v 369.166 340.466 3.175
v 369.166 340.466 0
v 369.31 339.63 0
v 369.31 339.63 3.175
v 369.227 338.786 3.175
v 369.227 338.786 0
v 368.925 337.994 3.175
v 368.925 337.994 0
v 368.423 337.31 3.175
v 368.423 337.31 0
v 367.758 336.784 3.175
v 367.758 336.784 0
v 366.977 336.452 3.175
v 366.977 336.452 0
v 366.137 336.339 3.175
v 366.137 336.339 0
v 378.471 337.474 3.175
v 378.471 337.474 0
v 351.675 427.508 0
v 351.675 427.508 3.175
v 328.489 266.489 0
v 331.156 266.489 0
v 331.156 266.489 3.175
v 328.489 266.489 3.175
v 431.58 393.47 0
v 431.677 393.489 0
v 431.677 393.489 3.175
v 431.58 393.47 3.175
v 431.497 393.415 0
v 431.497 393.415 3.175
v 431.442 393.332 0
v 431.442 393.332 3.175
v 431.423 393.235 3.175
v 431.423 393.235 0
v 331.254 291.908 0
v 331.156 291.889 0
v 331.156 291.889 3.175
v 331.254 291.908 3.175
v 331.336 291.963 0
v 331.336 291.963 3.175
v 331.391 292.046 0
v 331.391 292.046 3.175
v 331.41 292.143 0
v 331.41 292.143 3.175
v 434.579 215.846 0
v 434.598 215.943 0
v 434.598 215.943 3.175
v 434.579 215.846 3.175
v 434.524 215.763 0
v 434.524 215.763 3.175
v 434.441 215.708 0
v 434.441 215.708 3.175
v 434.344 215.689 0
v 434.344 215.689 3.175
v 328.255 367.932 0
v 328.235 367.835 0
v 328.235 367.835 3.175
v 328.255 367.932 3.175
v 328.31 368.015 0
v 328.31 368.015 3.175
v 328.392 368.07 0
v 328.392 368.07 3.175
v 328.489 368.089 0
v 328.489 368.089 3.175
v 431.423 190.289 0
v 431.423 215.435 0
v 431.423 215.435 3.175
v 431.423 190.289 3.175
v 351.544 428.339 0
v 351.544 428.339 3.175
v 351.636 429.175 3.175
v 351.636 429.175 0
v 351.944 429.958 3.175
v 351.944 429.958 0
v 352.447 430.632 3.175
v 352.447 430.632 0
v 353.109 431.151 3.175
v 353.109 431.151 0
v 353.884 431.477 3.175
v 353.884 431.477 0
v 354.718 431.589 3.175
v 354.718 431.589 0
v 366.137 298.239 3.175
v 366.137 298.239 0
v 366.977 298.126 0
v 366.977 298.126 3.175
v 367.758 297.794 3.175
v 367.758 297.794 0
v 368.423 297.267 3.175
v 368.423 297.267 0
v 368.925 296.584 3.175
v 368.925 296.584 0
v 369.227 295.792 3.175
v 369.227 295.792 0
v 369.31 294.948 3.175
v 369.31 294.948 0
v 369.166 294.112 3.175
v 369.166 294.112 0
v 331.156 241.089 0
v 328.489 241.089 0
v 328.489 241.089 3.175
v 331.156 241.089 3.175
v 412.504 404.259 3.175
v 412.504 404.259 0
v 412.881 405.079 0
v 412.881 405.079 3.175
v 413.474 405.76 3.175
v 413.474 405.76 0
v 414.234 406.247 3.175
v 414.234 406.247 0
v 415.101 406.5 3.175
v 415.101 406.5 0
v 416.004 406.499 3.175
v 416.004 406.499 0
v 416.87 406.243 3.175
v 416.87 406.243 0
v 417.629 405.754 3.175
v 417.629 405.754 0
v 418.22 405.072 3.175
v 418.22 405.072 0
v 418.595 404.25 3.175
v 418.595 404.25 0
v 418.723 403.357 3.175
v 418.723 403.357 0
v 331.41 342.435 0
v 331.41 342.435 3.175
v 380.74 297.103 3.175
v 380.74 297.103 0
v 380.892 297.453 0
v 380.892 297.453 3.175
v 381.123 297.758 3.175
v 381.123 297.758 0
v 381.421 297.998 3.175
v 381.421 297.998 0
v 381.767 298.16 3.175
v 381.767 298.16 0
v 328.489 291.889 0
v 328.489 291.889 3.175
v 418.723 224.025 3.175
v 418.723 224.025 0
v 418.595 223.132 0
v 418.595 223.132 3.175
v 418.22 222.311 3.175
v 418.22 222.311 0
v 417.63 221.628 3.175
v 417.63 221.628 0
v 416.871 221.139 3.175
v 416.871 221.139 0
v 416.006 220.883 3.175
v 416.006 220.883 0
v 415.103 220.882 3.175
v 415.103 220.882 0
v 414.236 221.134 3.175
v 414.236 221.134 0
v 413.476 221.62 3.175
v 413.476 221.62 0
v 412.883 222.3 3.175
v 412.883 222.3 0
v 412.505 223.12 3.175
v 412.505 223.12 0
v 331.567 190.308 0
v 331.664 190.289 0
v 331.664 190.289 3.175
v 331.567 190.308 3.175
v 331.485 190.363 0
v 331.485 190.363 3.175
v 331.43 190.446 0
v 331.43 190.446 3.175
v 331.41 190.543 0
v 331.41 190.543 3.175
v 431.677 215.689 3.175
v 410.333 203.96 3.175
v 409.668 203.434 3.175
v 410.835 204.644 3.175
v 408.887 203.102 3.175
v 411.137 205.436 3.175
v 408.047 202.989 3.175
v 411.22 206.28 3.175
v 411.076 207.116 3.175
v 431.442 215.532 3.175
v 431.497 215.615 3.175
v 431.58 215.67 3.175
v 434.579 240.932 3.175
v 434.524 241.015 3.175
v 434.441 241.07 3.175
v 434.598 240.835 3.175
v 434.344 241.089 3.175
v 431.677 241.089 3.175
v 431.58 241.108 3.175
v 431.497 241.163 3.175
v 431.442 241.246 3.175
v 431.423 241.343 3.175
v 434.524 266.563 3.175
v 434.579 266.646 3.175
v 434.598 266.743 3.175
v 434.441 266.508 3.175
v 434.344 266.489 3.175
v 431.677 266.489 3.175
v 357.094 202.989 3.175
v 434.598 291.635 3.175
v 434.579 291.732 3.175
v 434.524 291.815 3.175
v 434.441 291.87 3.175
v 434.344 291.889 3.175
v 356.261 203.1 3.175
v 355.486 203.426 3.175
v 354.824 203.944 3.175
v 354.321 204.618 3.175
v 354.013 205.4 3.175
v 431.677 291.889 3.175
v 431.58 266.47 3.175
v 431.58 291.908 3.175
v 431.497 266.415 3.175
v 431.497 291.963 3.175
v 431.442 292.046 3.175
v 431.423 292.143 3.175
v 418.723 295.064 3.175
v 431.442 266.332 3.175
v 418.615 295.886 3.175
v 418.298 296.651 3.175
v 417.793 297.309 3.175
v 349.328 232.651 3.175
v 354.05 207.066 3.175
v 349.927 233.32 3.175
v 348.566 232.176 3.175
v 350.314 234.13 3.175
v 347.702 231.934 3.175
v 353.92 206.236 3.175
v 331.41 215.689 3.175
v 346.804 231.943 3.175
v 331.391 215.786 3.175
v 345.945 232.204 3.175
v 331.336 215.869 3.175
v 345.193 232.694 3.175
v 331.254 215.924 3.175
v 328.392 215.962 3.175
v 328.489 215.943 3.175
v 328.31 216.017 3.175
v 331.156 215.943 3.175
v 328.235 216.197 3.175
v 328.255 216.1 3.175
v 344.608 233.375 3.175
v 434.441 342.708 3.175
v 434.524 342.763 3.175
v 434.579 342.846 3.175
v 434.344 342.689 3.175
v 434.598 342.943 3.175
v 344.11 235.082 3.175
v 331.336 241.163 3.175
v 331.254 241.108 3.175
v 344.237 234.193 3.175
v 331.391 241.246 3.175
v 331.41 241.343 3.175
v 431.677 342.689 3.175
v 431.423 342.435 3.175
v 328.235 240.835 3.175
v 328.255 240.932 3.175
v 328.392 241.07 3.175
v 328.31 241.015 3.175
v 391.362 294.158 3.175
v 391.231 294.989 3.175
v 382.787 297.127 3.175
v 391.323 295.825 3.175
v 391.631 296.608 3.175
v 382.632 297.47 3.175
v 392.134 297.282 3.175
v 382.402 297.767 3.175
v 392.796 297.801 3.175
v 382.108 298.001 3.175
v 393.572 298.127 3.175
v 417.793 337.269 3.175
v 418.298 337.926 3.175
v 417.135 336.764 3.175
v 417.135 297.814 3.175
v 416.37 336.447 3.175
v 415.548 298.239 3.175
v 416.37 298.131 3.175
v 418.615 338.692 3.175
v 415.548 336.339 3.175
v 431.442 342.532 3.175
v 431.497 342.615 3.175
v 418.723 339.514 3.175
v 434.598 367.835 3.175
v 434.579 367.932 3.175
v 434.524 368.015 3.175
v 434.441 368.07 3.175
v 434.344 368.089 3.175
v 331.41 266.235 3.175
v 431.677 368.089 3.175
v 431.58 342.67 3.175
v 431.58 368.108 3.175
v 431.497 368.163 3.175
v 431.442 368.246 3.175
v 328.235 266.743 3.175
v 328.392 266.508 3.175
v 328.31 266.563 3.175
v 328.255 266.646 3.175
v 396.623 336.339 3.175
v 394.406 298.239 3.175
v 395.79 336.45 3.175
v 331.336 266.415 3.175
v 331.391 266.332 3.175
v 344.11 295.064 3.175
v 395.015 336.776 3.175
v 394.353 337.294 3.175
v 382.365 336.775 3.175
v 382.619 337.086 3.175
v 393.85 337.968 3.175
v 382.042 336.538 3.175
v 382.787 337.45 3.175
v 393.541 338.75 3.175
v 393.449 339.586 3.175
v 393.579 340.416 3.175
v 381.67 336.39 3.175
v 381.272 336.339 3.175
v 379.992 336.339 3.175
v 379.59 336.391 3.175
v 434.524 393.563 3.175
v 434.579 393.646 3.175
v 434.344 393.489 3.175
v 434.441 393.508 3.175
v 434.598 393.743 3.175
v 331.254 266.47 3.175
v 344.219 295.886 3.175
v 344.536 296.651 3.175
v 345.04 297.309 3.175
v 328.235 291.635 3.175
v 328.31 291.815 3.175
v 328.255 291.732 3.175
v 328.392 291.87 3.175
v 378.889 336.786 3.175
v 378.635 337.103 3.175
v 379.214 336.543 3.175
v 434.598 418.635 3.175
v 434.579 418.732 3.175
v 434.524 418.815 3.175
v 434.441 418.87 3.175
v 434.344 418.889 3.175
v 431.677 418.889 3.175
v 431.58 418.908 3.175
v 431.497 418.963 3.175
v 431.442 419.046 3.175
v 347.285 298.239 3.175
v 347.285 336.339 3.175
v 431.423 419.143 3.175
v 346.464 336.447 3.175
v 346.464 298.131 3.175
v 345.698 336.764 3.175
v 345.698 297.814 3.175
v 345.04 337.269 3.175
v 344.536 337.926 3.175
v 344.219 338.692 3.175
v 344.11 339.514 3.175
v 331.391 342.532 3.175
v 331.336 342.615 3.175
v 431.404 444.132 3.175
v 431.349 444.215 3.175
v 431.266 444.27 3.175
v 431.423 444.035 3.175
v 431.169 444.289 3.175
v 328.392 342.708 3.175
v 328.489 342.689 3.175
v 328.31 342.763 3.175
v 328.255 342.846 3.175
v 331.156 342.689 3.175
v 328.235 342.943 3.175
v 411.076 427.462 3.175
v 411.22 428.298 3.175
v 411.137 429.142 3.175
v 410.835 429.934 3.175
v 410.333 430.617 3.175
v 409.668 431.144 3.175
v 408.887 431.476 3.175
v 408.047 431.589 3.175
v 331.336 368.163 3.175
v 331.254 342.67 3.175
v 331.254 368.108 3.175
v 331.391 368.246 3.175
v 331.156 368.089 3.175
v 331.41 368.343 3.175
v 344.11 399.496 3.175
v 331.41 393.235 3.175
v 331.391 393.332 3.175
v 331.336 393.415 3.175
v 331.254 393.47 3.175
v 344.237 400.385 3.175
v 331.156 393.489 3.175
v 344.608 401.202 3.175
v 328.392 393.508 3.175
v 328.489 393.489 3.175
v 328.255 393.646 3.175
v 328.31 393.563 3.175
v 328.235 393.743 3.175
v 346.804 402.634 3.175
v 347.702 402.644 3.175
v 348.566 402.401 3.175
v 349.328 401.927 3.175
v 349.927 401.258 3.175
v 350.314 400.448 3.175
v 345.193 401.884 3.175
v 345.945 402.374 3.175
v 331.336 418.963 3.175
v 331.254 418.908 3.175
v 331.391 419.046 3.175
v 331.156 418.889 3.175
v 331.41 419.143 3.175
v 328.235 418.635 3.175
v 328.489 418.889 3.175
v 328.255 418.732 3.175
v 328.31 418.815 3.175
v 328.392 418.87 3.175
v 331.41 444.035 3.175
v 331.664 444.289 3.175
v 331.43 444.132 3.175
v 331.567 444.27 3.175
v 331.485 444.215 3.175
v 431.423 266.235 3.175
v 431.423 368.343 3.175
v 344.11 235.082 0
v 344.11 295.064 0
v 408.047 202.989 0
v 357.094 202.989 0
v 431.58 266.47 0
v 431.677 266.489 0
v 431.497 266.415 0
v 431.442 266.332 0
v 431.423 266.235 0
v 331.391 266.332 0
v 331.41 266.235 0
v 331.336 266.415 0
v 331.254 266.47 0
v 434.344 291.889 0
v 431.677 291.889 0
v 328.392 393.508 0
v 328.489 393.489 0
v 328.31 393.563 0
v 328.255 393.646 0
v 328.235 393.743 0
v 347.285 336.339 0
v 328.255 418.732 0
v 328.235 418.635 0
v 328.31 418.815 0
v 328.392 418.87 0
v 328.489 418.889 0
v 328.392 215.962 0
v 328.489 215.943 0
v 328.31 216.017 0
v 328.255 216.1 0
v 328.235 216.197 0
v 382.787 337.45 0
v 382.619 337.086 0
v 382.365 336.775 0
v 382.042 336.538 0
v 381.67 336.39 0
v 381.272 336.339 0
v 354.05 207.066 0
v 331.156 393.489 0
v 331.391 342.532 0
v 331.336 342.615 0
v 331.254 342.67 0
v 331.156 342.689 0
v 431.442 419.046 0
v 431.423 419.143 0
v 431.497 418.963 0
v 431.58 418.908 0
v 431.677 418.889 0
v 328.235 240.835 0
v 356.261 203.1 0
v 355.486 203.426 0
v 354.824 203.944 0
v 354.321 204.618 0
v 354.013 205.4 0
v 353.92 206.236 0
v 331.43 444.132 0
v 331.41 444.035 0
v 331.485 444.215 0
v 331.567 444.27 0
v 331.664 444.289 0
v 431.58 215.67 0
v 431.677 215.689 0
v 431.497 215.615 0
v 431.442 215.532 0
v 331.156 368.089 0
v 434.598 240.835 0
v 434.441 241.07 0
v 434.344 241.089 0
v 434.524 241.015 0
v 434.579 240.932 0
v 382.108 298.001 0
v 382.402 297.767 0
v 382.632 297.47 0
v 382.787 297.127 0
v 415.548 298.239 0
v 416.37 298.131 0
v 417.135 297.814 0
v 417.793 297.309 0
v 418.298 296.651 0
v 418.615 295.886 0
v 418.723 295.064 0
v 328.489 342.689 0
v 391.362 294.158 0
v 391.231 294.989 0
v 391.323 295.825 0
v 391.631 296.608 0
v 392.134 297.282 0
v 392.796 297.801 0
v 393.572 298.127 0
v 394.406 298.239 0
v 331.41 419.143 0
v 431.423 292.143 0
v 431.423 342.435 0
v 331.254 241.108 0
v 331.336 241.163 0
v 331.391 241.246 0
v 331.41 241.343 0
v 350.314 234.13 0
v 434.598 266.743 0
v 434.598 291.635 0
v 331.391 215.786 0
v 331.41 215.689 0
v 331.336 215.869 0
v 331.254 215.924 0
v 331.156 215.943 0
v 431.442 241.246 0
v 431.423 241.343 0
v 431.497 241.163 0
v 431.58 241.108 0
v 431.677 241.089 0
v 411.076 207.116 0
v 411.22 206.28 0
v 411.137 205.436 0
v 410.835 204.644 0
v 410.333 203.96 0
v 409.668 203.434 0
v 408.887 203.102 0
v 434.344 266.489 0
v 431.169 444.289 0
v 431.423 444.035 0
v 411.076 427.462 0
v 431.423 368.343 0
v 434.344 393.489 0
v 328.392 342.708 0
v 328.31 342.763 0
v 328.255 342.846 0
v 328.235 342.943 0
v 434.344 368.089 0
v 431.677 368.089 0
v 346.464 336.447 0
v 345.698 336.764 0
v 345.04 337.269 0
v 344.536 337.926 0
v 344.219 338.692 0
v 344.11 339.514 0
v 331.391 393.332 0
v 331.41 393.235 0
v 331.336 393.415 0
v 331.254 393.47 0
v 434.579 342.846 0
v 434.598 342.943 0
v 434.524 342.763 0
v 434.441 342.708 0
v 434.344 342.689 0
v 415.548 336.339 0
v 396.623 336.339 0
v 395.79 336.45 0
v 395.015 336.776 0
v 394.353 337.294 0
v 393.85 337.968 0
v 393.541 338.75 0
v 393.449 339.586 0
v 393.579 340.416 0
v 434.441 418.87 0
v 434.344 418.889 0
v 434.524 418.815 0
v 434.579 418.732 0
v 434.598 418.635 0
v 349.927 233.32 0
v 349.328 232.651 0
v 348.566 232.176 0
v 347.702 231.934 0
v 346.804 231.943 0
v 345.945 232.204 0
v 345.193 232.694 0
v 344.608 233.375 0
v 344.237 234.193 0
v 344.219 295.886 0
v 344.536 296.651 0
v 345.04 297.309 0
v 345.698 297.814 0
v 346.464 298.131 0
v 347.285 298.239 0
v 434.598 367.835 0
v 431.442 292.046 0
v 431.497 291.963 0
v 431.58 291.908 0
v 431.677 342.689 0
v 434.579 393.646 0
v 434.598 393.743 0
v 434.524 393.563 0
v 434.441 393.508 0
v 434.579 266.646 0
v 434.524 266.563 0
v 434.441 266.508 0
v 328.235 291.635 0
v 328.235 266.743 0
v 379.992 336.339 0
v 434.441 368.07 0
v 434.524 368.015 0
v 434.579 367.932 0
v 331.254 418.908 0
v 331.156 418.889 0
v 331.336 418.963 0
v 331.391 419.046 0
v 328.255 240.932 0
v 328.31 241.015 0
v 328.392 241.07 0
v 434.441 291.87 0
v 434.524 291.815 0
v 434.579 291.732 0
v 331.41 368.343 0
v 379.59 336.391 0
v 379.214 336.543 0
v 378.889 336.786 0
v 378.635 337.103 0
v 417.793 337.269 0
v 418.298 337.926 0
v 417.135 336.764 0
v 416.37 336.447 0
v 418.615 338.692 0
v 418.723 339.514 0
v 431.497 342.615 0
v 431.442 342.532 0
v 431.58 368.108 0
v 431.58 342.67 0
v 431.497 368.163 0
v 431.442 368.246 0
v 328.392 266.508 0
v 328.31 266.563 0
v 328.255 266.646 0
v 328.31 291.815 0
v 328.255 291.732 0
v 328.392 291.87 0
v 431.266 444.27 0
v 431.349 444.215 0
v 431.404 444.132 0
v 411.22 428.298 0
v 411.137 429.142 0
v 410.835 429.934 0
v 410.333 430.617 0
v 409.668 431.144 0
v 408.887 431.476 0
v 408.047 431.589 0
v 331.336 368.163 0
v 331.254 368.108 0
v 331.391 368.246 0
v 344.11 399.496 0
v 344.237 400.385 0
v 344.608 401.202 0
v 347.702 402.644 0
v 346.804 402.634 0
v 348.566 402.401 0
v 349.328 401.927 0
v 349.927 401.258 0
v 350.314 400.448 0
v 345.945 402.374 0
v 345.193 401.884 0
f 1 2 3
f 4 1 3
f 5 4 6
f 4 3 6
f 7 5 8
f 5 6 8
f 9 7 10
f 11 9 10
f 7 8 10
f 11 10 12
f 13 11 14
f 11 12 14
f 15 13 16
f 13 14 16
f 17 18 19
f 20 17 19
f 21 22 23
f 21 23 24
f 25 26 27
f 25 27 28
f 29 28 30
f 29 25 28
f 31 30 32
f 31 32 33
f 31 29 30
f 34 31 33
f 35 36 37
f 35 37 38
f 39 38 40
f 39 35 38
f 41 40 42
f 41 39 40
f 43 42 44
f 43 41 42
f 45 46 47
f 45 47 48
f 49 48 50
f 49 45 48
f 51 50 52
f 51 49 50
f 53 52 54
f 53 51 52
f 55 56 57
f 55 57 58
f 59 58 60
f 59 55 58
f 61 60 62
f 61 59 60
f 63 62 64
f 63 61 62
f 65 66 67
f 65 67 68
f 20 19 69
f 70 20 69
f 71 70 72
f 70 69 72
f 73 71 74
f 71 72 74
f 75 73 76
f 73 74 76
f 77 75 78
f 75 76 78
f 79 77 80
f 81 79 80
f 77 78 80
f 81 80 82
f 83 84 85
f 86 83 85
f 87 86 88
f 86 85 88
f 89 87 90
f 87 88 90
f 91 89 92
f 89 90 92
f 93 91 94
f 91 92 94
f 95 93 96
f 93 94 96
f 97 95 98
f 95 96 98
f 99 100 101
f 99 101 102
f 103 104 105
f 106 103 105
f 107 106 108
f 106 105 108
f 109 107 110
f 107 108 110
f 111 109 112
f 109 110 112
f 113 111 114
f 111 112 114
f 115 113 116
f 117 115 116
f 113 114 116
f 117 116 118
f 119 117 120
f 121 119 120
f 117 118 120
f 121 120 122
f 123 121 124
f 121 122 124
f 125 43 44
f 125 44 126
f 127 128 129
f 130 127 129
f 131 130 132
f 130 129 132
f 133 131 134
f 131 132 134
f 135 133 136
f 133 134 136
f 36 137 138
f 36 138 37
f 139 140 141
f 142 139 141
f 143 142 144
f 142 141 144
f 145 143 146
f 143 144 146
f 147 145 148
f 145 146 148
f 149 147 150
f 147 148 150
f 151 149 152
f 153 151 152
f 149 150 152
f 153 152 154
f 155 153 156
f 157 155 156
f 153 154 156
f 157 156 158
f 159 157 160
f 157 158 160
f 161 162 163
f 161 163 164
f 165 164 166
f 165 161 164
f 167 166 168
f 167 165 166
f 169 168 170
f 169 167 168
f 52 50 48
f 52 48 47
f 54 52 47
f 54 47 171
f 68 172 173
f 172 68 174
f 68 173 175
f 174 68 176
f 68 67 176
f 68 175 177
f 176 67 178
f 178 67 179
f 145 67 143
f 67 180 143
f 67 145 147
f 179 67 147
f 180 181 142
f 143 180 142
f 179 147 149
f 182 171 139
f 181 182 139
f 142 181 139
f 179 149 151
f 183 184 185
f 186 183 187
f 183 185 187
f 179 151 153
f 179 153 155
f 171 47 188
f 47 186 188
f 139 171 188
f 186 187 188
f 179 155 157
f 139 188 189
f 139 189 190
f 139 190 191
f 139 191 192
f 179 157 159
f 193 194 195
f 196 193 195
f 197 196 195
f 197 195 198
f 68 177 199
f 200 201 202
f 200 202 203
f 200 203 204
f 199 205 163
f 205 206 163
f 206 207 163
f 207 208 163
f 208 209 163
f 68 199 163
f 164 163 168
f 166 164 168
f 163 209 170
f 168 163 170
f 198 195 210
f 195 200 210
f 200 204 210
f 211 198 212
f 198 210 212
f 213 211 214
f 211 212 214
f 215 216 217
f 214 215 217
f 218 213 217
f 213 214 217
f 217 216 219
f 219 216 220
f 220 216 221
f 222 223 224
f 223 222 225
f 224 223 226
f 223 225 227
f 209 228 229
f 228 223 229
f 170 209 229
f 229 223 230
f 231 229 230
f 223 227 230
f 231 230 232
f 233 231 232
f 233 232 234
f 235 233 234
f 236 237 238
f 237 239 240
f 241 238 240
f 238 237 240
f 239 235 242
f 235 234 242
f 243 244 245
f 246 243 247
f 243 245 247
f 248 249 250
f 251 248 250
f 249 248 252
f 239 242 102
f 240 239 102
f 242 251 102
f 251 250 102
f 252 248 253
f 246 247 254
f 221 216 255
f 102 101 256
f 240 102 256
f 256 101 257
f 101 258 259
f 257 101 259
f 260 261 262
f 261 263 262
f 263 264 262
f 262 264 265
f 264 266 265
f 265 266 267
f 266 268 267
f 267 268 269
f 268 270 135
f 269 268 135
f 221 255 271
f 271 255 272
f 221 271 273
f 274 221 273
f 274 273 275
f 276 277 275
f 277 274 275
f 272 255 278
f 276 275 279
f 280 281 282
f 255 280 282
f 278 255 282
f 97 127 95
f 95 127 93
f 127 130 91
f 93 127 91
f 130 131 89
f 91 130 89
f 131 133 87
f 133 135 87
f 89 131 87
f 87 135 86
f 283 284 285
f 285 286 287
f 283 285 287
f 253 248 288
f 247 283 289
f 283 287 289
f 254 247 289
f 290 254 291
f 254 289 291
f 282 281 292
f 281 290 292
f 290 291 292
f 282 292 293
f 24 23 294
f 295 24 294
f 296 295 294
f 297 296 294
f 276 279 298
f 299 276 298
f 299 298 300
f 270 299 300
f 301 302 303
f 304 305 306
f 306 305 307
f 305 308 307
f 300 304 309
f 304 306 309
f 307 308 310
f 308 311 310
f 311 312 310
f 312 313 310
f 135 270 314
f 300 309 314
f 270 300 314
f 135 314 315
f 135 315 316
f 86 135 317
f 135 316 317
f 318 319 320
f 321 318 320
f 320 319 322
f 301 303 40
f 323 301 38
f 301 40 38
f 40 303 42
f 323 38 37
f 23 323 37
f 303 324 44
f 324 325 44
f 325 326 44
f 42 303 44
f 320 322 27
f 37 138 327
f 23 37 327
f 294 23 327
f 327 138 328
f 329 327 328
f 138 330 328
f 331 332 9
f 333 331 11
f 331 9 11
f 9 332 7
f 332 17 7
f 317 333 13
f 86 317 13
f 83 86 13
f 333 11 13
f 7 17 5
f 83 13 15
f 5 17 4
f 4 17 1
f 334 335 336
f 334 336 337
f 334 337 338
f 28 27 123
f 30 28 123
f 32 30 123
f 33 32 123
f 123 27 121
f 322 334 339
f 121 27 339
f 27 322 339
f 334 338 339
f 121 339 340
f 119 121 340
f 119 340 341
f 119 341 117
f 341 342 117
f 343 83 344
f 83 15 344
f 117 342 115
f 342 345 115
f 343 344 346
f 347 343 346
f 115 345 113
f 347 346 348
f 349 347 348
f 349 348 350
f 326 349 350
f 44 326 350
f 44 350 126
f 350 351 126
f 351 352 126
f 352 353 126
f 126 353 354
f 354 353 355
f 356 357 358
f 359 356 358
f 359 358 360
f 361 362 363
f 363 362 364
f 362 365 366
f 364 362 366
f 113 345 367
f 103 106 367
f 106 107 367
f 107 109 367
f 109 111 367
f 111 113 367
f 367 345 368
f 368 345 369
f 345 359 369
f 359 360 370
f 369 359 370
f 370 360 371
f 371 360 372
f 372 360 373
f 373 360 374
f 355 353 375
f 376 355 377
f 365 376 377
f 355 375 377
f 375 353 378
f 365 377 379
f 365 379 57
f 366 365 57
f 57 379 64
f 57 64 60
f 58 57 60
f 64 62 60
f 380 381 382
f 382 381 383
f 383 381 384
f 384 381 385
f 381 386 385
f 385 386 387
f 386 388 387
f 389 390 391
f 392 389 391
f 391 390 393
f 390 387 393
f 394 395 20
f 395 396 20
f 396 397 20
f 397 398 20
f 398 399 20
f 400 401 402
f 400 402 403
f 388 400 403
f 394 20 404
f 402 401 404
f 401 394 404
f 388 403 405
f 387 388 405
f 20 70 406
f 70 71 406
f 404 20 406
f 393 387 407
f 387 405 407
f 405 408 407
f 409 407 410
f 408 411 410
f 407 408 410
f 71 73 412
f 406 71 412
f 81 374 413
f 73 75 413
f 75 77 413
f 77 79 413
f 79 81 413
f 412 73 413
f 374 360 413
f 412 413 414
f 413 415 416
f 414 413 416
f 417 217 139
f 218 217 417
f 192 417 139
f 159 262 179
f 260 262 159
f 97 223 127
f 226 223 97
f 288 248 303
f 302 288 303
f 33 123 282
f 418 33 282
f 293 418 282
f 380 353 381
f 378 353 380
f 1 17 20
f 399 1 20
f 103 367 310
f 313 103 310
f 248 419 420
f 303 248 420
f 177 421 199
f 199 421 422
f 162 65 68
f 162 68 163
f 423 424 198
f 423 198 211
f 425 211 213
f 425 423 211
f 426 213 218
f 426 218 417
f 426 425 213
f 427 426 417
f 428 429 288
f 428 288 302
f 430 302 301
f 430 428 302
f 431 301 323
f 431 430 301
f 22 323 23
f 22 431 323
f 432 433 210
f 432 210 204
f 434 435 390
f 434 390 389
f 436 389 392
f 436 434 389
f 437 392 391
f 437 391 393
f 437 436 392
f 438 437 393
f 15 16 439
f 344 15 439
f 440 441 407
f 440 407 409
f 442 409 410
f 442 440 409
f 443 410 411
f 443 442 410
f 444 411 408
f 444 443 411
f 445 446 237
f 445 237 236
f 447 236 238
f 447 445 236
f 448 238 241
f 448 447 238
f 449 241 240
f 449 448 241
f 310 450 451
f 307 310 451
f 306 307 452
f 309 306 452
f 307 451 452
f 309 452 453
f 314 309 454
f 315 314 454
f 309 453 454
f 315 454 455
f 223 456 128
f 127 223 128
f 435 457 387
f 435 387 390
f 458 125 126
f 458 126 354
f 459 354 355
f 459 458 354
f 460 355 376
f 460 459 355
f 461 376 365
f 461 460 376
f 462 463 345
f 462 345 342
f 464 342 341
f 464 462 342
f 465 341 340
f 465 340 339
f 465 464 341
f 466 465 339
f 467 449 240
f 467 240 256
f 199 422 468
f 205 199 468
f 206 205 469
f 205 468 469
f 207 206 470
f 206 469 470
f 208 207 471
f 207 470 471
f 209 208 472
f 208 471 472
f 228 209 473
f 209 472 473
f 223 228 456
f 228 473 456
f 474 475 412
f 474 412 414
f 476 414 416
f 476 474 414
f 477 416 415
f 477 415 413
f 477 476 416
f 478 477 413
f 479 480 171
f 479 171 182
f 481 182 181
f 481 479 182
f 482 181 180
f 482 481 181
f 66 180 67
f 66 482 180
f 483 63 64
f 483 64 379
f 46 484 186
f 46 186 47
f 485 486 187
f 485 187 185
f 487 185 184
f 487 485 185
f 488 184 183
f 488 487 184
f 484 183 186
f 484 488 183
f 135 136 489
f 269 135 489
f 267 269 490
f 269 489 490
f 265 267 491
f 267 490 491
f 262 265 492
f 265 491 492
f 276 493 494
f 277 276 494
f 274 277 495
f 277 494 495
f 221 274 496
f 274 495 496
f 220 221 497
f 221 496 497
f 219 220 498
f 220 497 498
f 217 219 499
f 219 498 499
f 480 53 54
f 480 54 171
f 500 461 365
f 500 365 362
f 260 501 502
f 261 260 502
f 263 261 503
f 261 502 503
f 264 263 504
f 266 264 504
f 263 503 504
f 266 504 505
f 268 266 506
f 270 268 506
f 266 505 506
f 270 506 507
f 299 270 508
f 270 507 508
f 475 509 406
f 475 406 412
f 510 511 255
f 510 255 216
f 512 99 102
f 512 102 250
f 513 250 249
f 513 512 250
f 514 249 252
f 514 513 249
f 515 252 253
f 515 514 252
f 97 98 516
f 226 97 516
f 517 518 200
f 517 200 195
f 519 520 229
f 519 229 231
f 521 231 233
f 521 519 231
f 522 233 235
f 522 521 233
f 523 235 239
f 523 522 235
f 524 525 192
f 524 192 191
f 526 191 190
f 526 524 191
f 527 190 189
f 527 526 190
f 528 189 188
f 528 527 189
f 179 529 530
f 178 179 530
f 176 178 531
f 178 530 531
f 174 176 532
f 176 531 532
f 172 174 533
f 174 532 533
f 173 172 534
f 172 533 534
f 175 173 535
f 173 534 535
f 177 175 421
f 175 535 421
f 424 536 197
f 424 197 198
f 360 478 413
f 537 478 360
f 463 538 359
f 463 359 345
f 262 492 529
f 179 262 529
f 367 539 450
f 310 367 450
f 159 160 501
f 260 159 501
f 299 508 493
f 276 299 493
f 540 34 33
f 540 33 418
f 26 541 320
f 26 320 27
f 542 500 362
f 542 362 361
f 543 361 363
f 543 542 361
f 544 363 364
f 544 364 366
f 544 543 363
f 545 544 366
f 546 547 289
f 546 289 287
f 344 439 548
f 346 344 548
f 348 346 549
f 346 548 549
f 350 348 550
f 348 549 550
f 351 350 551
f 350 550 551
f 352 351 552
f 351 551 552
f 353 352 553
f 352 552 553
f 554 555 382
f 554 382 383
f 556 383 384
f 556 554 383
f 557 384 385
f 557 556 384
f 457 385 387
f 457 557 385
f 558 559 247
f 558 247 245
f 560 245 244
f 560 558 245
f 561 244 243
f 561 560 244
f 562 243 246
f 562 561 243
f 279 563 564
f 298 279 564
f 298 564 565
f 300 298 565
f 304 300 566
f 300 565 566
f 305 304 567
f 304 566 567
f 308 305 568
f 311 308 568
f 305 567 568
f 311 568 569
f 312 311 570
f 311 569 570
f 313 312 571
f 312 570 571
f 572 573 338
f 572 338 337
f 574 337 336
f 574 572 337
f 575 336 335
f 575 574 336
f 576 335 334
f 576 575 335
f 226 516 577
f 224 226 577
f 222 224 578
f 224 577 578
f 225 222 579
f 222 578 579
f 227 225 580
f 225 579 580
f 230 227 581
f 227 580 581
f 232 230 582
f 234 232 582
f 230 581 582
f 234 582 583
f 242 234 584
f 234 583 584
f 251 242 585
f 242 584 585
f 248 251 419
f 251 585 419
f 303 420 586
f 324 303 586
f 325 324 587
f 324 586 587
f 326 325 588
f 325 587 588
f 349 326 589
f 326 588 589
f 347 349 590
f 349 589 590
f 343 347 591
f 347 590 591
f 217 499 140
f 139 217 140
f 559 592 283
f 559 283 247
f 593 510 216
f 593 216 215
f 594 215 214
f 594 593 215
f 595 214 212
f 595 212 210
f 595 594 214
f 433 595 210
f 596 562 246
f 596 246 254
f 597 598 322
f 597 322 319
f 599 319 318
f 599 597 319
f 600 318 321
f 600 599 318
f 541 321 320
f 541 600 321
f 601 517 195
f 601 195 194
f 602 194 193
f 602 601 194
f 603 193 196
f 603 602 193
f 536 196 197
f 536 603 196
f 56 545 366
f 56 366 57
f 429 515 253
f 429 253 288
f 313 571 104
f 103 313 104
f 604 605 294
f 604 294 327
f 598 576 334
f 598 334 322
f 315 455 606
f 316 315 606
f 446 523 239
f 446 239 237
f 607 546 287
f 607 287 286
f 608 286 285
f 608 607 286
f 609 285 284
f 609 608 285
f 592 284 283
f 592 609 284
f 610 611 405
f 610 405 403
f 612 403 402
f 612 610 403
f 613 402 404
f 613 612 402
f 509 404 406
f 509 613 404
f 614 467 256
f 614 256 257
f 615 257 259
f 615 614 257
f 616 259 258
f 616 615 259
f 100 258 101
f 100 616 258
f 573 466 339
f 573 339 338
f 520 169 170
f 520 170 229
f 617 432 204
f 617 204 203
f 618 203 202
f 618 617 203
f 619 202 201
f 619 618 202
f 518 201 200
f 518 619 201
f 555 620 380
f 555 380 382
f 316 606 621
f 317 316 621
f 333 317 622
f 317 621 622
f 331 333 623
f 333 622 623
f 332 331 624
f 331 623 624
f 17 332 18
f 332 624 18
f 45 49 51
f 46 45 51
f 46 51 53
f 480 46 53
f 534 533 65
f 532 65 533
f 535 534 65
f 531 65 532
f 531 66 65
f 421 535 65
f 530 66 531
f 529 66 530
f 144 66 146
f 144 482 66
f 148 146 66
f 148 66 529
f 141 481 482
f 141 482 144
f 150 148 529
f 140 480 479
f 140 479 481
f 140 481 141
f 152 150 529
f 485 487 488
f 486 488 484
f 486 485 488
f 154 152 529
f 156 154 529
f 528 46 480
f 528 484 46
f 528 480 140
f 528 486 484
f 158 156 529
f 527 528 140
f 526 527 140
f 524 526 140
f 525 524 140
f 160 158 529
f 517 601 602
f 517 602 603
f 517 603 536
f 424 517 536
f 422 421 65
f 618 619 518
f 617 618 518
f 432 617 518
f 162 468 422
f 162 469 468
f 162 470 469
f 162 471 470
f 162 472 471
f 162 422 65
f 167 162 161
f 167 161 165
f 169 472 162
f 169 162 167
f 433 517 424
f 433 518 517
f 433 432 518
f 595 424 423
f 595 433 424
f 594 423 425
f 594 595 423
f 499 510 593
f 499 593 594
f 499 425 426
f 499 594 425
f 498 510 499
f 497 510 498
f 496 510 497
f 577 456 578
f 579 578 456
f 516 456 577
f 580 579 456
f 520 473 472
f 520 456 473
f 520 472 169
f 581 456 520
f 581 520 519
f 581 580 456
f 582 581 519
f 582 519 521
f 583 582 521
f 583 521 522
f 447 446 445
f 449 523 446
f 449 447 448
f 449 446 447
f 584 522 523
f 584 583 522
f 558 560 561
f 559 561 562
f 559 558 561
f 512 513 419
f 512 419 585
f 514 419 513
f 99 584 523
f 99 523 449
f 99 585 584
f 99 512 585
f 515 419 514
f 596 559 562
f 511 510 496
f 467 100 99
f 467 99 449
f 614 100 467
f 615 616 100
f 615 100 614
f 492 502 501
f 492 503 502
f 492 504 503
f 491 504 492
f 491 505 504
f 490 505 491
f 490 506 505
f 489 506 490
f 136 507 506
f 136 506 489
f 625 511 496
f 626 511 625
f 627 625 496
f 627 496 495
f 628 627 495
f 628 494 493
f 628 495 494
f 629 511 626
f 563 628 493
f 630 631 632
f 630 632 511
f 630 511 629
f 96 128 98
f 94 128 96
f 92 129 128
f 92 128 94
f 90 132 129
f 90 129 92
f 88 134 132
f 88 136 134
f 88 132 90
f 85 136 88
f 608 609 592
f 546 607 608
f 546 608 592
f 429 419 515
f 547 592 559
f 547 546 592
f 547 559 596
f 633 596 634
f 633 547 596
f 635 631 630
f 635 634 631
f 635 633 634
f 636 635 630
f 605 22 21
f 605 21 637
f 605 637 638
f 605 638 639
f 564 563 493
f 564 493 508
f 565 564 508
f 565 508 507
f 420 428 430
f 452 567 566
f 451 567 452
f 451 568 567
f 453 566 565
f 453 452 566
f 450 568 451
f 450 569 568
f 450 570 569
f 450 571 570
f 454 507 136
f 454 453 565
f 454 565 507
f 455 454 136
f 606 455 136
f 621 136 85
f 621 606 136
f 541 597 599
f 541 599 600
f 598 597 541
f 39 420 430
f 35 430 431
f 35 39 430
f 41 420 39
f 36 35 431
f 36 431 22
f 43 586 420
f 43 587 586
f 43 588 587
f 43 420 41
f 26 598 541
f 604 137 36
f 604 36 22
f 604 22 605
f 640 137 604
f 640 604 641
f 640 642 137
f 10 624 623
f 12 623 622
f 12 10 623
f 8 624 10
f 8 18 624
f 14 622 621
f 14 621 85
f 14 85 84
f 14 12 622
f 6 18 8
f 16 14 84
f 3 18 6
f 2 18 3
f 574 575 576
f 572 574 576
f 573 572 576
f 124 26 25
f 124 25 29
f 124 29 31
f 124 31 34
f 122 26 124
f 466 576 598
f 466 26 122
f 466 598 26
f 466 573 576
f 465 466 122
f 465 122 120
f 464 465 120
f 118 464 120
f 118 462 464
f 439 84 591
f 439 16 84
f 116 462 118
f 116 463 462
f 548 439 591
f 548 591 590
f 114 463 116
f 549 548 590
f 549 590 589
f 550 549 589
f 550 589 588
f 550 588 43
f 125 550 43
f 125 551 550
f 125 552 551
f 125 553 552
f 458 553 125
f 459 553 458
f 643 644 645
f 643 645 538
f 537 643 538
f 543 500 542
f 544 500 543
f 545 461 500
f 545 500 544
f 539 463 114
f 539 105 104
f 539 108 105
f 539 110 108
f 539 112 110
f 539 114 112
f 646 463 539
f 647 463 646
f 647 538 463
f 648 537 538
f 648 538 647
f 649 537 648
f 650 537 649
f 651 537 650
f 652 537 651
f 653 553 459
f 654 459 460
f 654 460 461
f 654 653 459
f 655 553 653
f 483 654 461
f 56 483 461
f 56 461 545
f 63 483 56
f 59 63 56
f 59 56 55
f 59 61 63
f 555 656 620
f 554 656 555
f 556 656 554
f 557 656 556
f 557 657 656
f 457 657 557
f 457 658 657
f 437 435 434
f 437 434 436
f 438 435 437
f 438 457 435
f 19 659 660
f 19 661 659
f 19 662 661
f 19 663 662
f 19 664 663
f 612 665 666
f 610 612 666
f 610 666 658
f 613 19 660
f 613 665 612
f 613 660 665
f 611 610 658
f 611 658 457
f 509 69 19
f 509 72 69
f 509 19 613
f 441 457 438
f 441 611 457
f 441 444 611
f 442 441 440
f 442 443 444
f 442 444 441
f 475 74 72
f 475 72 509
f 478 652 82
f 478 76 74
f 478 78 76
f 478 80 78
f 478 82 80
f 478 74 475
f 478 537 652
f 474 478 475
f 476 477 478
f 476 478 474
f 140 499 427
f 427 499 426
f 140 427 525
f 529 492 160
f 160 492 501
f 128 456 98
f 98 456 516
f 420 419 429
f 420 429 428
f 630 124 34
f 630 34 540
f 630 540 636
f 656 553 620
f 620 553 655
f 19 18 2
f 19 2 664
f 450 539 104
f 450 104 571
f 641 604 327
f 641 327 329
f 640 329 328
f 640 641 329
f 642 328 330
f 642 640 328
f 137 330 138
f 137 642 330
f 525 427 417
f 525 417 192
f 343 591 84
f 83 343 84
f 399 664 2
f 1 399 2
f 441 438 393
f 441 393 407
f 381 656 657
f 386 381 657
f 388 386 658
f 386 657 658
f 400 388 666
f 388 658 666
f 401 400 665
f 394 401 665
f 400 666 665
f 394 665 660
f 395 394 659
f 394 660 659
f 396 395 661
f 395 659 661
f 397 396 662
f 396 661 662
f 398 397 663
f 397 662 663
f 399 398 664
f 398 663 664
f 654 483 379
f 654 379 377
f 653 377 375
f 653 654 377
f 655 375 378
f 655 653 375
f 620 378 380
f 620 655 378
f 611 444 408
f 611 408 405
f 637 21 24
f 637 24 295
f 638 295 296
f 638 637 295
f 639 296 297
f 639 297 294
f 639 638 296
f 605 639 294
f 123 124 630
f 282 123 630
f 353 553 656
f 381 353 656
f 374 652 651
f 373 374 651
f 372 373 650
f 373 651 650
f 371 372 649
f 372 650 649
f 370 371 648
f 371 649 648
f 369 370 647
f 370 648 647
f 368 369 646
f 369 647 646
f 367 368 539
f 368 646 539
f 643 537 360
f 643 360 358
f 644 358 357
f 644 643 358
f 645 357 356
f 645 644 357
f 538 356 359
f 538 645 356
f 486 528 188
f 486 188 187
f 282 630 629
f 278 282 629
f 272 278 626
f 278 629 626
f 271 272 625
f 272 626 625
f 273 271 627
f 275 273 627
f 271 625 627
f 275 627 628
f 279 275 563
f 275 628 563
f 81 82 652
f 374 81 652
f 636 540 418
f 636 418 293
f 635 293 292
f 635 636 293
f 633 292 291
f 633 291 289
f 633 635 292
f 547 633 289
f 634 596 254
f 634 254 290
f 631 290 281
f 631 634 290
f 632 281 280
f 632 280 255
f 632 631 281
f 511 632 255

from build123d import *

# Parameters (mm, degrees)
BOSS_EXTRUDE3_DEPTH = 3.175


with BuildPart() as part:
    # Model → Boss-Extrude3 (new body)
    with BuildSketch(Plane.XY):
        with BuildLine():
            Line((431.422937797, 190.288897242), (331.664437797, 190.288897242))
            ThreePointArc((331.664437797, 190.288897242), (331.484832675, 190.36329212), (331.410437797, 190.542897242))
            Line((331.410437797, 190.542897242), (331.410437797, 215.688897242))
            ThreePointArc((331.410437797, 215.688897242), (331.33604292, 215.868502364), (331.156437797, 215.942897242))
            Line((331.156437797, 215.942897242), (328.489437797, 215.942897242))
            ThreePointArc((328.489437797, 215.942897242), (328.309832675, 216.01729212), (328.235437797, 216.196897242))
            Line((328.235437797, 216.196897242), (328.235437797, 240.834897242))
            ThreePointArc((328.235437797, 240.834897242), (328.309832675, 241.014502364), (328.489437797, 241.088897242))
            Line((328.489437797, 241.088897242), (331.156437797, 241.088897242))
            ThreePointArc((331.156437797, 241.088897242), (331.33604292, 241.16329212), (331.410437797, 241.342897242))
            Line((331.410437797, 241.342897242), (331.410437797, 266.234897242))
            ThreePointArc((331.410437797, 266.234897242), (331.33604292, 266.414502364), (331.156437797, 266.488897242))
            Line((331.156437797, 266.488897242), (328.489437797, 266.488897242))
            ThreePointArc((328.489437797, 266.488897242), (328.309832675, 266.56329212), (328.235437797, 266.742897242))
            Line((328.235437797, 266.742897242), (328.235437797, 291.634897242))
            ThreePointArc((328.235437797, 291.634897242), (328.309832675, 291.814502364), (328.489437797, 291.888897242))
            Line((328.489437797, 291.888897242), (331.156437797, 291.888897242))
            ThreePointArc((331.156437797, 291.888897242), (331.33604292, 291.96329212), (331.410437797, 292.142897242))
            Line((331.410437797, 292.142897242), (331.410437797, 342.434897242))
            ThreePointArc((331.410437797, 342.434897242), (331.33604292, 342.614502364), (331.156437797, 342.688897242))
            Line((331.156437797, 342.688897242), (328.489437797, 342.688897242))
            ThreePointArc((328.489437797, 342.688897242), (328.309832675, 342.76329212), (328.235437797, 342.942897242))
            Line((328.235437797, 342.942897242), (328.235437797, 367.834897242))
            ThreePointArc((328.235437797, 367.834897242), (328.309832675, 368.014502364), (328.489437797, 368.088897242))
            Line((328.489437797, 368.088897242), (331.156437797, 368.088897242))
            ThreePointArc((331.156437797, 368.088897242), (331.33604292, 368.16329212), (331.410437797, 368.342897242))
            Line((331.410437797, 368.342897242), (331.410437797, 393.234897242))
            ThreePointArc((331.410437797, 393.234897242), (331.33604292, 393.414502364), (331.156437797, 393.488897242))
            Line((331.156437797, 393.488897242), (328.489437797, 393.488897242))
            ThreePointArc((328.489437797, 393.488897242), (328.309832675, 393.56329212), (328.235437797, 393.742897242))
            Line((328.235437797, 393.742897242), (328.235437797, 418.634897242))
            ThreePointArc((328.235437797, 418.634897242), (328.309832675, 418.814502364), (328.489437797, 418.888897242))
            Line((328.489437797, 418.888897242), (331.156437797, 418.888897242))
            ThreePointArc((331.156437797, 418.888897242), (331.33604292, 418.96329212), (331.410437797, 419.142897242))
            Line((331.410437797, 419.142897242), (331.410437797, 444.034897242))
            ThreePointArc((331.410437797, 444.034897242), (331.484832675, 444.214502364), (331.664437797, 444.288897242))
            Line((331.664437797, 444.288897242), (431.168937797, 444.288897242))
            ThreePointArc((431.168937797, 444.288897242), (431.34854292, 444.214502364), (431.422937797, 444.034897242))
            Line((431.422937797, 444.034897242), (431.422937797, 419.142897242))
            ThreePointArc((431.422937797, 419.142897242), (431.497332675, 418.96329212), (431.676937797, 418.888897242))
            Line((431.676937797, 418.888897242), (434.343937797, 418.888897242))
            ThreePointArc((434.343937797, 418.888897242), (434.52354292, 418.814502364), (434.597937797, 418.634897242))
            Line((434.597937797, 418.634897242), (434.597937797, 393.742897242))
            ThreePointArc((434.597937797, 393.742897242), (434.52354292, 393.56329212), (434.343937797, 393.488897242))
            Line((434.343937797, 393.488897242), (431.676937797, 393.488897242))
            ThreePointArc((431.676937797, 393.488897242), (431.497332675, 393.414502364), (431.422937797, 393.234897242))
            Line((431.422937797, 393.234897242), (431.422937797, 368.342897242))
            ThreePointArc((431.422937797, 368.342897242), (431.497332675, 368.16329212), (431.676937797, 368.088897242))
            Line((431.676937797, 368.088897242), (434.343937797, 368.088897242))
            ThreePointArc((434.343937797, 368.088897242), (434.52354292, 368.014502364), (434.597937797, 367.834897242))
            Line((434.597937797, 367.834897242), (434.597937797, 342.942897242))
            ThreePointArc((434.597937797, 342.942897242), (434.52354292, 342.76329212), (434.343937797, 342.688897242))
            Line((434.343937797, 342.688897242), (431.676937797, 342.688897242))
            ThreePointArc((431.676937797, 342.688897242), (431.497332675, 342.614502364), (431.422937797, 342.434897242))
            Line((431.422937797, 342.434897242), (431.422937797, 292.142897242))
            ThreePointArc((431.422937797, 292.142897242), (431.497332675, 291.96329212), (431.676937797, 291.888897242))
            Line((431.676937797, 291.888897242), (434.343937797, 291.888897242))
            ThreePointArc((434.343937797, 291.888897242), (434.52354292, 291.814502364), (434.597937797, 291.634897242))
            Line((434.597937797, 291.634897242), (434.597937797, 266.742897242))
            ThreePointArc((434.597937797, 266.742897242), (434.52354292, 266.56329212), (434.343937797, 266.488897242))
            Line((434.343937797, 266.488897242), (431.676937797, 266.488897242))
            ThreePointArc((431.676937797, 266.488897242), (431.497332675, 266.414502364), (431.422937797, 266.234897242))
            Line((431.422937797, 266.234897242), (431.422937797, 241.342897242))
            ThreePointArc((431.422937797, 241.342897242), (431.497332675, 241.16329212), (431.676937797, 241.088897242))
            Line((431.676937797, 241.088897242), (434.343937797, 241.088897242))
            ThreePointArc((434.343937797, 241.088897242), (434.52354292, 241.014502364), (434.597937797, 240.834897242))
            Line((434.597937797, 240.834897242), (434.597937797, 215.942897242))
            ThreePointArc((434.597937797, 215.942897242), (434.52354292, 215.76329212), (434.343937797, 215.688897242))
            Line((434.343937797, 215.688897242), (431.676937797, 215.688897242))
            ThreePointArc((431.676937797, 215.688897242), (431.497332675, 215.614502364), (431.422937797, 215.434897242))
            Line((431.422937797, 215.434897242), (431.422937797, 190.288897242))
        make_face()
        with BuildLine():
            Line((382.786560027, 297.127371964), (411.075896543, 207.115846687))
            ThreePointArc((411.075896543, 207.115846687), (410.606562601, 204.285309273), (408.046966492, 202.988897242))
            Line((408.046966492, 202.988897242), (357.094405319, 202.988897242))
            ThreePointArc((357.094405319, 202.988897242), (354.550237774, 204.264466668), (354.050329968, 207.066244326))
            Line((354.050329968, 207.066244326), (380.739668991, 297.102568741))
            ThreePointArc((380.739668991, 297.102568741), (381.123130271, 297.75765158), (381.766901137, 298.15981467))
            ThreePointArc((381.766901137, 298.15981467), (382.401598049, 297.766914662), (382.786560027, 297.127371964))
        make_face(mode=Mode.SUBTRACT)
        with BuildLine():
            Line((394.40551129, 298.238897242), (415.547937797, 298.238897242))
            ThreePointArc((415.547937797, 298.238897242), (417.793001827, 297.308961272), (418.722937797, 295.063897242))
            Line((418.722937797, 295.063897242), (418.722937797, 224.025344178))
            ThreePointArc((418.722937797, 224.025344178), (416.005554119, 220.88349563), (412.504851308, 223.119667846))
            Line((412.504851308, 223.119667846), (391.362427311, 294.158212475))
            ThreePointArc((391.362427311, 294.158212475), (391.860302641, 296.961932524), (394.40551129, 298.238897242))
        make_face(mode=Mode.SUBTRACT)
        with BuildLine():
            Line((354.71801129, 431.588897242), (408.046966492, 431.588897242))
            ThreePointArc((408.046966492, 431.588897242), (410.606562601, 430.292485211), (411.075896543, 427.461947797))
            Line((411.075896543, 427.461947797), (382.786560027, 337.45042252))
            ThreePointArc((382.786560027, 337.45042252), (382.211388986, 336.646599187), (381.272095002, 336.338897242))
            Line((381.272095002, 336.338897242), (379.992498353, 336.338897242))
            ThreePointArc((379.992498353, 336.338897242), (379.043481575, 336.653792274), (378.470956978, 337.473552796))
            Line((378.470956978, 337.473552796), (351.674924794, 427.508220933))
            ThreePointArc((351.674924794, 427.508220933), (352.172805279, 430.311936061), (354.71801129, 431.588897242))
        make_face(mode=Mode.SUBTRACT)
        with BuildLine():
            Line((418.722937797, 403.356536927), (418.722937797, 339.513897242))
            ThreePointArc((418.722937797, 339.513897242), (417.793001827, 337.268833212), (415.547937797, 336.338897242))
            Line((415.547937797, 336.338897242), (396.623155319, 336.338897242))
            ThreePointArc((396.623155319, 336.338897242), (394.078987861, 337.614466553), (393.579079886, 340.416244049))
            Line((393.579079886, 340.416244049), (412.503864616, 404.25889133))
            ThreePointArc((412.503864616, 404.25889133), (416.003839459, 406.498634741), (418.722937797, 403.356536927))
        make_face(mode=Mode.SUBTRACT)
        with BuildLine():
            Line((350.314367848, 400.447983443), (369.165896543, 340.465846687))
            ThreePointArc((369.165896543, 340.465846687), (368.696562601, 337.635309273), (366.136966492, 336.338897242))
            Line((366.136966492, 336.338897242), (347.285437797, 336.338897242))
            ThreePointArc((347.285437797, 336.338897242), (345.040373767, 337.268833212), (344.110437797, 339.513897242))
            Line((344.110437797, 339.513897242), (344.110437797, 399.496038941))
            ThreePointArc((344.110437797, 399.496038941), (346.803894766, 402.634304431), (350.314367848, 400.447983443))
        make_face(mode=Mode.SUBTRACT)
        with BuildLine():
            Line((369.165896543, 294.111947797), (350.314367848, 234.129811041))
            ThreePointArc((350.314367848, 234.129811041), (346.803894766, 231.943490053), (344.110437797, 235.081755542))
            Line((344.110437797, 235.081755542), (344.110437797, 295.063897242))
            ThreePointArc((344.110437797, 295.063897242), (345.040373767, 297.308961272), (347.285437797, 298.238897242))
            Line((347.285437797, 298.238897242), (366.136966492, 298.238897242))
            ThreePointArc((366.136966492, 298.238897242), (368.696562601, 296.942485211), (369.165896543, 294.111947797))
        make_face(mode=Mode.SUBTRACT)
    extrude(amount=BOSS_EXTRUDE3_DEPTH)


solid = part.part
